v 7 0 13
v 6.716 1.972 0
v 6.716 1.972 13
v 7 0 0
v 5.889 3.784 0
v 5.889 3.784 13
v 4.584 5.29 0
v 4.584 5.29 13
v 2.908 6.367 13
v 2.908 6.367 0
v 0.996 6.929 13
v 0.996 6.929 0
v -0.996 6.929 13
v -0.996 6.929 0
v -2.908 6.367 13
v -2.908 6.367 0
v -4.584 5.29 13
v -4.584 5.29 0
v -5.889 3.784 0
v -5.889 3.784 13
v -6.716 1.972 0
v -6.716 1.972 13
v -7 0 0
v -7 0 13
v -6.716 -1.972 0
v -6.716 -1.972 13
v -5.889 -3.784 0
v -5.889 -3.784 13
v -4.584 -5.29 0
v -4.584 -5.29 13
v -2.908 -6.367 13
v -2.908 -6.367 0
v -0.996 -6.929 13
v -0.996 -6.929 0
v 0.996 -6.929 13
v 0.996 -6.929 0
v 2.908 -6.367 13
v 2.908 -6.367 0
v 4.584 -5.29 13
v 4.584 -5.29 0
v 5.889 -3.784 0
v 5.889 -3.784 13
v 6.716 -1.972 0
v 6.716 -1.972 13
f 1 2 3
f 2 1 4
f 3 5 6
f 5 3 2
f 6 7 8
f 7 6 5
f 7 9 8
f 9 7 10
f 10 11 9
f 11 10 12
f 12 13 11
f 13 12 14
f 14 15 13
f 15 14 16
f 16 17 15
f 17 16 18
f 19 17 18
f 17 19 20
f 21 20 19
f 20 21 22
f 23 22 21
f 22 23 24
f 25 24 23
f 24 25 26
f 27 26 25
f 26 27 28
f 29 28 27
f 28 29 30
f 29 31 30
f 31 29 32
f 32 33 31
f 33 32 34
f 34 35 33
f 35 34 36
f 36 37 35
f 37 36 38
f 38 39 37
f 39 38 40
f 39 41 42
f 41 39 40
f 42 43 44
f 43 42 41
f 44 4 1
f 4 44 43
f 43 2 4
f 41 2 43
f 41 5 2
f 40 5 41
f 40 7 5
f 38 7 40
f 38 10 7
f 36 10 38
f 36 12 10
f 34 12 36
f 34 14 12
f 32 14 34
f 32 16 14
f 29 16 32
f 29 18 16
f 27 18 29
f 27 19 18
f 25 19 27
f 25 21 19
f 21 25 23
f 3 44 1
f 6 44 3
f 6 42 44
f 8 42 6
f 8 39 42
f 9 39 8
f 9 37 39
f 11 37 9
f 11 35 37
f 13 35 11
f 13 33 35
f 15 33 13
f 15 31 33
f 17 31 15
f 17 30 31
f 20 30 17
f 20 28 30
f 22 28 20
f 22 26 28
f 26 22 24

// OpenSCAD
// Generated by SolidPython 1.0.1 on 2020-07-29 00:46:44


cylinder(h = 13, r1 = 7, r2 = 7);
/***********************************************
*********      SolidPython code:      **********
************************************************
 
# import packages: SolidPython
from solid import *
from solid.utils import *
from itertools import chain, combinations, permutations


class Resize:

    def __init__(self, scad_file):
        self.scad_file = scad_file
        #self.scad_file = import_scad(scad_file)
        # cone/cylinder param:
        self.r1 = 0
        self.r2 = 0
        self.h = 0
        # rectangular prism param:
        self.w = 0
        self.l = 0
        # ellipse param:
        self.r = 0

    # import OpenScad code (file name corresponds to shape)


    # classify shape + parameters
    def assign(self, param1, param2, param3):
        if self.scad_file == 'cone.scad':
            self.r1 = param1
            self.r2 = param2
            self.h = param3
        elif self.scad_file == 'cylinder.scad':
            self.r1 = param1
            self.r2 = param2
            self.h = param3
        elif self.scad_file == 'rectangularPrism.scad':
            self.h = param1
            self.l = param2
            self.w = param3
        else:
            self.r = param1
            self.h = param2

    # resize parameters
    def iterate(self):
        x = range(3, 20, 2)
        i = 1
        if self.scad_file == 'cone.scad':
            tempList = list(permutations(x, 2))
            for temp in tempList:
                param1 = temp[0]
                param2 = temp[1]
                filepath = 'produced_scad_files/' + 'cone' + str(param1) + '_' + str(param2) + '_' + '.scad'
                scad_render_to_file(cylinder(h=param1, r1=param2, r2=0), filepath)

        elif self.scad_file == 'cylinder.scad':
            tempList = list(permutations(x, 3))
            for temp in tempList:
                param1 = temp[0]
                param2 = temp[1]
                filepath = 'produced_scad_files/' + 'cylinder' + str(param1) + '_' + str(param2) + '_' + '.scad'
                scad_render_to_file(cylinder(h=param1, r1=param2, r2=param2), filepath)

        elif self.scad_file == 'rectangularPrism.scad':
            tempList = list(permutations(x, 3))
            for temp in tempList:
                param1 = temp[0]
                param2 = temp[1]
                param3 = temp[2]
                filepath = 'produced_scad_files/' + 'rectangularPrism' + str(param1) + '_' + str(param2) + '_' + str(
                    param3) + '.scad'
                scad_render_to_file(cube(size=(param1, param2, param3)), filepath)

        elif self.scad_file == 'ellipse.scad':
            tempList = list(permutations(x, 4))
            for temp in tempList:
                param1 = temp[0]
                param2 = temp[1]
                param3 = temp[2]
                param4 = temp[3]
                filepath = 'produced_scad_files/' + 'ellipse' + str(param1) + '_' + str(param2) + '_' + str(param3) + '_' + str(param4) + '.scad'
                scad_render_to_file(scale([param1, param2, param3])(sphere(r=param4)), filepath)

    def render_to_scadfile(self):
        scad_render_to_file(scad, 'example.scad') 
 
************************************************/
